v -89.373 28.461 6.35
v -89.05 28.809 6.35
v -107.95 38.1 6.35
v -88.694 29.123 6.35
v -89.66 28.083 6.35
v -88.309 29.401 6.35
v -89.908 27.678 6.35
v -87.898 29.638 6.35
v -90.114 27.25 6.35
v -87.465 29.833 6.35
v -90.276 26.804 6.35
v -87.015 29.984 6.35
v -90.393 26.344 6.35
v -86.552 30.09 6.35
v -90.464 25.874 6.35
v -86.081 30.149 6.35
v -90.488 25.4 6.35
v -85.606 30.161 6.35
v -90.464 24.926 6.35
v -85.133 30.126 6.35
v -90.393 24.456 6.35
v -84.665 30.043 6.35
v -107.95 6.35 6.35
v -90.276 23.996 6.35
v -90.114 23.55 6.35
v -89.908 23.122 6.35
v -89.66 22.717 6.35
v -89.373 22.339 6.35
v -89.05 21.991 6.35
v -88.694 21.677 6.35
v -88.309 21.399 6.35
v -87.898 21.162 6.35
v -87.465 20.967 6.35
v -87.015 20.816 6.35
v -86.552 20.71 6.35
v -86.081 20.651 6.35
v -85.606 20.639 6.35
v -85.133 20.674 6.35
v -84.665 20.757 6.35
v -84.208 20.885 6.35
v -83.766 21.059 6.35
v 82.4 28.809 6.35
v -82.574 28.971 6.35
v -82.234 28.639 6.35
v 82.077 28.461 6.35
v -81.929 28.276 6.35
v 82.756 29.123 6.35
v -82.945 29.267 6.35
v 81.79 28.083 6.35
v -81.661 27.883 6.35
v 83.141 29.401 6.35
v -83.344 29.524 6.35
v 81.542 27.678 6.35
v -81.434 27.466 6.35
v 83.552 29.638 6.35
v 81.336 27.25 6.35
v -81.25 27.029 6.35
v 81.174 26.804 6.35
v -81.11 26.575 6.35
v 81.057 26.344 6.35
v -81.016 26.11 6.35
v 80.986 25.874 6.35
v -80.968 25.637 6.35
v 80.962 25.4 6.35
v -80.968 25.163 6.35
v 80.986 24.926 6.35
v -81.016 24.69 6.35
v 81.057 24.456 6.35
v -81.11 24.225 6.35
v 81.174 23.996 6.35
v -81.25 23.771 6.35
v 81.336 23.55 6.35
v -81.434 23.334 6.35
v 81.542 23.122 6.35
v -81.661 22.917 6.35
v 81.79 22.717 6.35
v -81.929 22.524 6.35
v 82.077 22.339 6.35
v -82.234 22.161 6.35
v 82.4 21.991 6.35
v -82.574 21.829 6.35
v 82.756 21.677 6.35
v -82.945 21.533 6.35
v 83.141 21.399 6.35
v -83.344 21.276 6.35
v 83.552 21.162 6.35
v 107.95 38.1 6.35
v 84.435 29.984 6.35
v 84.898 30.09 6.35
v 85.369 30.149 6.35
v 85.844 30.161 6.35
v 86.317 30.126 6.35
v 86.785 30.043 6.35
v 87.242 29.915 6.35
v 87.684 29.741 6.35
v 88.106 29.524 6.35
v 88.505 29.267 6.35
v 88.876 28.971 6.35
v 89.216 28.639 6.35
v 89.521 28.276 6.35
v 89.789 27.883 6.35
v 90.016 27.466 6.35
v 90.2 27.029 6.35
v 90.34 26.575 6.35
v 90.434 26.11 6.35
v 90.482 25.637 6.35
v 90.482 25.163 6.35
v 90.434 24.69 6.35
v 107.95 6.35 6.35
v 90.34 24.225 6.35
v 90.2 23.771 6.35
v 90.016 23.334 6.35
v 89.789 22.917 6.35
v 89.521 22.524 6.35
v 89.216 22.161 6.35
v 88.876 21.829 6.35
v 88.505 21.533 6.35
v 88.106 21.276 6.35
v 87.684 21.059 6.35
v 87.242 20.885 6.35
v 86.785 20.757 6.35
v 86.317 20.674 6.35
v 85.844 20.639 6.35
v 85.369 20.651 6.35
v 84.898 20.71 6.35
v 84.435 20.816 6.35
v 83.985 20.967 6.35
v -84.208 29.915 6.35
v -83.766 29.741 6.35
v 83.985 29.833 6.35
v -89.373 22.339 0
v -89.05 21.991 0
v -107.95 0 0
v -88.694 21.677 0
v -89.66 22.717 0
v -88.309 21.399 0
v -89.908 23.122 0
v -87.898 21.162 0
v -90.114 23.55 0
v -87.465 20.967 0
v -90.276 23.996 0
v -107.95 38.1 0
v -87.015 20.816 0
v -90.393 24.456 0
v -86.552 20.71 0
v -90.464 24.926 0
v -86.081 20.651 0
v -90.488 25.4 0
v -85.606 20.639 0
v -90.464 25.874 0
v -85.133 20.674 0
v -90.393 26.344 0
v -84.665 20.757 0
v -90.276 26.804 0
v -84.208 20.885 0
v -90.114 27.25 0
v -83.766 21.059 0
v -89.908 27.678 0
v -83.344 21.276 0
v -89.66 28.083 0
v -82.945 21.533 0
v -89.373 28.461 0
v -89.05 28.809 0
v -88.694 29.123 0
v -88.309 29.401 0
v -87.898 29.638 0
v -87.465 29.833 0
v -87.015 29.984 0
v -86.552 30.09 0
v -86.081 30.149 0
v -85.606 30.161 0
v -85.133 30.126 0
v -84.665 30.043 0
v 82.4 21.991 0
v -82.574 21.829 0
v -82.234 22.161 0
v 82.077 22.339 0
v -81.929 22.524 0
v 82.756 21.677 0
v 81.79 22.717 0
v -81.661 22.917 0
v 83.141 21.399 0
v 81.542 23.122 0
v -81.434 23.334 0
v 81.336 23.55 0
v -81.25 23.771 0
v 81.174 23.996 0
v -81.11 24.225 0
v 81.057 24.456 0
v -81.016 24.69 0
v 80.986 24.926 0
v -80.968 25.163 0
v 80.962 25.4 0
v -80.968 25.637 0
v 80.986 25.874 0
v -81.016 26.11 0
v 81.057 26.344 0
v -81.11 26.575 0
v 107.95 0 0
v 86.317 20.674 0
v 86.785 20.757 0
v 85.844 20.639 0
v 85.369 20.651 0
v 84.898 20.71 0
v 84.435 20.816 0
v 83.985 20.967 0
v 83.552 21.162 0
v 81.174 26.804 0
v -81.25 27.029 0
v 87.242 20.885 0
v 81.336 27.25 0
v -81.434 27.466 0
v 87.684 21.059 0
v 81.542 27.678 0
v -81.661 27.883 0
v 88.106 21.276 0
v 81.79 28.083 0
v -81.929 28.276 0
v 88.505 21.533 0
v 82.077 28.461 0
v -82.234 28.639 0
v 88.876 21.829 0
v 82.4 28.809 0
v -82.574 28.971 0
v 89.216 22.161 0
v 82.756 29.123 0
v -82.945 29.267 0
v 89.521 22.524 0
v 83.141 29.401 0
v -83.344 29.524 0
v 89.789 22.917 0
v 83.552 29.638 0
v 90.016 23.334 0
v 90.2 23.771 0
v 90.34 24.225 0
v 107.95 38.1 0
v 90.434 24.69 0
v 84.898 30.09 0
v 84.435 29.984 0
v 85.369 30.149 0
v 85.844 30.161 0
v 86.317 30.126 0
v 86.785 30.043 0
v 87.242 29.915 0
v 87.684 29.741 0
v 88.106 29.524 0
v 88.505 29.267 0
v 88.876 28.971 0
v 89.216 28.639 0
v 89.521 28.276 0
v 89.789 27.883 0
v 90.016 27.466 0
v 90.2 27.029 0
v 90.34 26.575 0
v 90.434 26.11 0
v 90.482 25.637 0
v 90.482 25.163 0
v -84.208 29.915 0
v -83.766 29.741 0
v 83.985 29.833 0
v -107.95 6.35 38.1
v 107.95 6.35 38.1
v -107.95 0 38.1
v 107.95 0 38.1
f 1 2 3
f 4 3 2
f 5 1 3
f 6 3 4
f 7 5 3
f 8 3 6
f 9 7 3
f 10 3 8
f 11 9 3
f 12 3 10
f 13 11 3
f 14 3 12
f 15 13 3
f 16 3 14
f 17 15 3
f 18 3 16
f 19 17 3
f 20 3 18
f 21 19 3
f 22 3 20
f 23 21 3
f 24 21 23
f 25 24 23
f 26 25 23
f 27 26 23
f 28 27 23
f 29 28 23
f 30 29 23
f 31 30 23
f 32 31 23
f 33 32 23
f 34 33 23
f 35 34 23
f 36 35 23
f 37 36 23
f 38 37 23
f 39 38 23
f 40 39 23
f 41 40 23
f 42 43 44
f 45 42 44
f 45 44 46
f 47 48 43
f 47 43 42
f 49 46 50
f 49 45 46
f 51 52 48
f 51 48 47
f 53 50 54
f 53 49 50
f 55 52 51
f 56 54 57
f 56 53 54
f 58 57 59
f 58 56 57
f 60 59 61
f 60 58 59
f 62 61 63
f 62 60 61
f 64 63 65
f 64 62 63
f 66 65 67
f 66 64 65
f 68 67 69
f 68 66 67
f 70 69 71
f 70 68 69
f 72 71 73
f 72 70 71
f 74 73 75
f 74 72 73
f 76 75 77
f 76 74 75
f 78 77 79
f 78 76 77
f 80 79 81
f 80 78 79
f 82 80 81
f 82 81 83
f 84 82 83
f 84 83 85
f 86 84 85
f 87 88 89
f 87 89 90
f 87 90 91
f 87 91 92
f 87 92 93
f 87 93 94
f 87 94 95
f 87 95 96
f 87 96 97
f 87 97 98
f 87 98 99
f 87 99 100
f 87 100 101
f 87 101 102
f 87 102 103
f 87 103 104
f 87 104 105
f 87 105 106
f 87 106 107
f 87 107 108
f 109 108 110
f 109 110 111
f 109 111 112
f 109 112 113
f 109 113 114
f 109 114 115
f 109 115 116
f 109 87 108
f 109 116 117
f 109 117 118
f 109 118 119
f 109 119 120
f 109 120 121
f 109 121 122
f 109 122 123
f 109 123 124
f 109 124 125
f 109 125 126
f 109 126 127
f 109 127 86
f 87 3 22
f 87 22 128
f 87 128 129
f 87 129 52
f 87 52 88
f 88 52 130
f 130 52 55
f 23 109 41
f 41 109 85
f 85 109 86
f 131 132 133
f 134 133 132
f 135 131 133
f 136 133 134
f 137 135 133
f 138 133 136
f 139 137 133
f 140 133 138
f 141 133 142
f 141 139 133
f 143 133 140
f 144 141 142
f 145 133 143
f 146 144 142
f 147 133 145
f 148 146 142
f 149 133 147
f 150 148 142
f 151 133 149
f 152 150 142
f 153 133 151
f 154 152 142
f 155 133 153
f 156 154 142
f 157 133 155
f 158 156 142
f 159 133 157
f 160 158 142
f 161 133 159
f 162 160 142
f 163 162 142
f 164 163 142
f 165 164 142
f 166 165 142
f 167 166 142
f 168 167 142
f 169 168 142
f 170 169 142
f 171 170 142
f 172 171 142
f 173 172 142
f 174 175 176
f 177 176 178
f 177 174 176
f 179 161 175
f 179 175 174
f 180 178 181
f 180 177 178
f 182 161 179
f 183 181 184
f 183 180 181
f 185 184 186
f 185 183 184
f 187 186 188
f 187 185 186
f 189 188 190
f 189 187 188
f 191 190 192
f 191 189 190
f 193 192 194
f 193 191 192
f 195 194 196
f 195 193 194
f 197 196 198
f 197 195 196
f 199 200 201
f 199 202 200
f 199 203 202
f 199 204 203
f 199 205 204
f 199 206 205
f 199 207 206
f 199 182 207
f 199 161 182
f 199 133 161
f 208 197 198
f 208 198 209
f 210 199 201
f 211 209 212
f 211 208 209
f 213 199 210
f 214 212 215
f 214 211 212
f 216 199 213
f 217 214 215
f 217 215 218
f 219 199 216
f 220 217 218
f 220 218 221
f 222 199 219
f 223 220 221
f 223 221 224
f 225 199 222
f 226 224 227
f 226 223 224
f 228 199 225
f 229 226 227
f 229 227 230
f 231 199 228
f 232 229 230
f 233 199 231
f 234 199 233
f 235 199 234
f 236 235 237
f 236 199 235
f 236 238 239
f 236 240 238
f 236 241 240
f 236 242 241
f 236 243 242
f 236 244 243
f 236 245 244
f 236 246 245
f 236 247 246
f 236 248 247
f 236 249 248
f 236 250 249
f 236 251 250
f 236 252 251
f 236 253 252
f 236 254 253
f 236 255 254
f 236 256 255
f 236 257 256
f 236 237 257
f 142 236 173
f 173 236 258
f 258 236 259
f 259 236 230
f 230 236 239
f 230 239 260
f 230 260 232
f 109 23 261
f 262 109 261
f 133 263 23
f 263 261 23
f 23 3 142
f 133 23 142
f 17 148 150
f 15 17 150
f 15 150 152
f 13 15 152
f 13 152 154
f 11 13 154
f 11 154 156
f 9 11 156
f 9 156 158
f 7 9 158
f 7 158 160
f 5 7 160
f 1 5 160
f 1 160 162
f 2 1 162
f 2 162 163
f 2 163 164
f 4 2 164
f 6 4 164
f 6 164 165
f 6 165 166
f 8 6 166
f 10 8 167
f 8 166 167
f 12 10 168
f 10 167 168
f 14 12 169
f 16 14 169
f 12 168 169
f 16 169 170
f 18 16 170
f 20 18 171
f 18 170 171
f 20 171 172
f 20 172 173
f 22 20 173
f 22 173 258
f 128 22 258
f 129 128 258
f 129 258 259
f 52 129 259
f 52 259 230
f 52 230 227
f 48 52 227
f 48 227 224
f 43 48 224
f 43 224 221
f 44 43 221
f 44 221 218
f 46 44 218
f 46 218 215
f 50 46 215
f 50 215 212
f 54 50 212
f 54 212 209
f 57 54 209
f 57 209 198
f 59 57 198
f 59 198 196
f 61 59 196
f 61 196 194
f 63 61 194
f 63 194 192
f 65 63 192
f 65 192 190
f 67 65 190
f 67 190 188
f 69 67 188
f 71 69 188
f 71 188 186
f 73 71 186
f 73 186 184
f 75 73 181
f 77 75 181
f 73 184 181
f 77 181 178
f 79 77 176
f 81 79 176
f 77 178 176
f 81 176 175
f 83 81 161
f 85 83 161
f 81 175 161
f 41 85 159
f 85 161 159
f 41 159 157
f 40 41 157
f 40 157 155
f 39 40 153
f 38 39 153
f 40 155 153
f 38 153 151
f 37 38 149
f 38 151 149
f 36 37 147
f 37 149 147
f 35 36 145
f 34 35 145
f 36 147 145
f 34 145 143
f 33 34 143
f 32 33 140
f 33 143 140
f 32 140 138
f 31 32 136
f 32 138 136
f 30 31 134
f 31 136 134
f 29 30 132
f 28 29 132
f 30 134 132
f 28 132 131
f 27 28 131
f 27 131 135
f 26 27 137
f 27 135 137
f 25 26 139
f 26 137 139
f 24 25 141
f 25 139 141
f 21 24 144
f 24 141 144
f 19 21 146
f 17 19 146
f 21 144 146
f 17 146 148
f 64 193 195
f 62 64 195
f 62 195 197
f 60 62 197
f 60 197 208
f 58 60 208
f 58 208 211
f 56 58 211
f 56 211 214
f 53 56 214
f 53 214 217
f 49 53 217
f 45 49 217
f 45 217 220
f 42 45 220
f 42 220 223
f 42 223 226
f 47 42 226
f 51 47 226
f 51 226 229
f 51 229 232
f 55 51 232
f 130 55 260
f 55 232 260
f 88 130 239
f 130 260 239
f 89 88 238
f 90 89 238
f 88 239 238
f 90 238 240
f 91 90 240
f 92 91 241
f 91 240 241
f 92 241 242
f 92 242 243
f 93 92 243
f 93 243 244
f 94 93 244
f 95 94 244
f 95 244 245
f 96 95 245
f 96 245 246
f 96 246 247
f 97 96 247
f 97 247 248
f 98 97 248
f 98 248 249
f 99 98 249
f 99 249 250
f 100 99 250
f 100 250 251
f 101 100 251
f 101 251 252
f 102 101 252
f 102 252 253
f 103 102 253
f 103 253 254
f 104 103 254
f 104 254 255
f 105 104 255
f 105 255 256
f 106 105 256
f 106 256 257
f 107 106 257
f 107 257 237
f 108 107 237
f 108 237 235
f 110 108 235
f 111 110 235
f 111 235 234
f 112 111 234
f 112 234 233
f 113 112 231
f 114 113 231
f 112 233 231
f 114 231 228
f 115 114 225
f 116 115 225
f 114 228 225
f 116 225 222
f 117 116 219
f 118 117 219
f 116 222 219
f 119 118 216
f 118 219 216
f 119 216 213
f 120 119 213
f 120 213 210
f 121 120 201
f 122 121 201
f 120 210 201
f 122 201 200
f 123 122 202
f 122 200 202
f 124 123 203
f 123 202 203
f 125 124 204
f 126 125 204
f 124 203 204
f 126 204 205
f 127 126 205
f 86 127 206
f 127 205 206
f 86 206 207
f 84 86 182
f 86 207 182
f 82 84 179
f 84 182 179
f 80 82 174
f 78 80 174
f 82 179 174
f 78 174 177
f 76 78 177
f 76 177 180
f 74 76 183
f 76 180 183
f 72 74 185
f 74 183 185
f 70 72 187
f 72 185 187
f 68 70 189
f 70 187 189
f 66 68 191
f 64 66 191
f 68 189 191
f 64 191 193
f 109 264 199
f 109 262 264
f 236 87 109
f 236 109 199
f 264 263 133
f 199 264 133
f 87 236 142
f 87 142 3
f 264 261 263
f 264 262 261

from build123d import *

# Parameters (mm, degrees)
EXTRUDE_THIN1_DEPTH          = 107.95
F_3_8_0_375_DIAMETER_HOLE1_D = 9.525


with BuildPart() as part:
    # Sketch1 → Extrude-Thin1 (new, symmetric)
    with BuildSketch(Plane(origin=(0, 0, 0), x_dir=(0, 0, -1), z_dir=(1, 0, 0))):
        Polygon((-38.1, 0), (0, 0), (0, 38.1), (-6.35, 38.1), (-6.35, 6.35), (-38.1, 6.35), align=None)
    extrude(amount=EXTRUDE_THIN1_DEPTH, both=True)

    # 3/8 (0.375) Diameter Hole1 (through all)
    with Locations(Plane.XY.offset(6.35)):
        with Locations((-85.725, 25.4), (85.725, 25.4)):
            Hole(F_3_8_0_375_DIAMETER_HOLE1_D / 2)


solid = part.part
